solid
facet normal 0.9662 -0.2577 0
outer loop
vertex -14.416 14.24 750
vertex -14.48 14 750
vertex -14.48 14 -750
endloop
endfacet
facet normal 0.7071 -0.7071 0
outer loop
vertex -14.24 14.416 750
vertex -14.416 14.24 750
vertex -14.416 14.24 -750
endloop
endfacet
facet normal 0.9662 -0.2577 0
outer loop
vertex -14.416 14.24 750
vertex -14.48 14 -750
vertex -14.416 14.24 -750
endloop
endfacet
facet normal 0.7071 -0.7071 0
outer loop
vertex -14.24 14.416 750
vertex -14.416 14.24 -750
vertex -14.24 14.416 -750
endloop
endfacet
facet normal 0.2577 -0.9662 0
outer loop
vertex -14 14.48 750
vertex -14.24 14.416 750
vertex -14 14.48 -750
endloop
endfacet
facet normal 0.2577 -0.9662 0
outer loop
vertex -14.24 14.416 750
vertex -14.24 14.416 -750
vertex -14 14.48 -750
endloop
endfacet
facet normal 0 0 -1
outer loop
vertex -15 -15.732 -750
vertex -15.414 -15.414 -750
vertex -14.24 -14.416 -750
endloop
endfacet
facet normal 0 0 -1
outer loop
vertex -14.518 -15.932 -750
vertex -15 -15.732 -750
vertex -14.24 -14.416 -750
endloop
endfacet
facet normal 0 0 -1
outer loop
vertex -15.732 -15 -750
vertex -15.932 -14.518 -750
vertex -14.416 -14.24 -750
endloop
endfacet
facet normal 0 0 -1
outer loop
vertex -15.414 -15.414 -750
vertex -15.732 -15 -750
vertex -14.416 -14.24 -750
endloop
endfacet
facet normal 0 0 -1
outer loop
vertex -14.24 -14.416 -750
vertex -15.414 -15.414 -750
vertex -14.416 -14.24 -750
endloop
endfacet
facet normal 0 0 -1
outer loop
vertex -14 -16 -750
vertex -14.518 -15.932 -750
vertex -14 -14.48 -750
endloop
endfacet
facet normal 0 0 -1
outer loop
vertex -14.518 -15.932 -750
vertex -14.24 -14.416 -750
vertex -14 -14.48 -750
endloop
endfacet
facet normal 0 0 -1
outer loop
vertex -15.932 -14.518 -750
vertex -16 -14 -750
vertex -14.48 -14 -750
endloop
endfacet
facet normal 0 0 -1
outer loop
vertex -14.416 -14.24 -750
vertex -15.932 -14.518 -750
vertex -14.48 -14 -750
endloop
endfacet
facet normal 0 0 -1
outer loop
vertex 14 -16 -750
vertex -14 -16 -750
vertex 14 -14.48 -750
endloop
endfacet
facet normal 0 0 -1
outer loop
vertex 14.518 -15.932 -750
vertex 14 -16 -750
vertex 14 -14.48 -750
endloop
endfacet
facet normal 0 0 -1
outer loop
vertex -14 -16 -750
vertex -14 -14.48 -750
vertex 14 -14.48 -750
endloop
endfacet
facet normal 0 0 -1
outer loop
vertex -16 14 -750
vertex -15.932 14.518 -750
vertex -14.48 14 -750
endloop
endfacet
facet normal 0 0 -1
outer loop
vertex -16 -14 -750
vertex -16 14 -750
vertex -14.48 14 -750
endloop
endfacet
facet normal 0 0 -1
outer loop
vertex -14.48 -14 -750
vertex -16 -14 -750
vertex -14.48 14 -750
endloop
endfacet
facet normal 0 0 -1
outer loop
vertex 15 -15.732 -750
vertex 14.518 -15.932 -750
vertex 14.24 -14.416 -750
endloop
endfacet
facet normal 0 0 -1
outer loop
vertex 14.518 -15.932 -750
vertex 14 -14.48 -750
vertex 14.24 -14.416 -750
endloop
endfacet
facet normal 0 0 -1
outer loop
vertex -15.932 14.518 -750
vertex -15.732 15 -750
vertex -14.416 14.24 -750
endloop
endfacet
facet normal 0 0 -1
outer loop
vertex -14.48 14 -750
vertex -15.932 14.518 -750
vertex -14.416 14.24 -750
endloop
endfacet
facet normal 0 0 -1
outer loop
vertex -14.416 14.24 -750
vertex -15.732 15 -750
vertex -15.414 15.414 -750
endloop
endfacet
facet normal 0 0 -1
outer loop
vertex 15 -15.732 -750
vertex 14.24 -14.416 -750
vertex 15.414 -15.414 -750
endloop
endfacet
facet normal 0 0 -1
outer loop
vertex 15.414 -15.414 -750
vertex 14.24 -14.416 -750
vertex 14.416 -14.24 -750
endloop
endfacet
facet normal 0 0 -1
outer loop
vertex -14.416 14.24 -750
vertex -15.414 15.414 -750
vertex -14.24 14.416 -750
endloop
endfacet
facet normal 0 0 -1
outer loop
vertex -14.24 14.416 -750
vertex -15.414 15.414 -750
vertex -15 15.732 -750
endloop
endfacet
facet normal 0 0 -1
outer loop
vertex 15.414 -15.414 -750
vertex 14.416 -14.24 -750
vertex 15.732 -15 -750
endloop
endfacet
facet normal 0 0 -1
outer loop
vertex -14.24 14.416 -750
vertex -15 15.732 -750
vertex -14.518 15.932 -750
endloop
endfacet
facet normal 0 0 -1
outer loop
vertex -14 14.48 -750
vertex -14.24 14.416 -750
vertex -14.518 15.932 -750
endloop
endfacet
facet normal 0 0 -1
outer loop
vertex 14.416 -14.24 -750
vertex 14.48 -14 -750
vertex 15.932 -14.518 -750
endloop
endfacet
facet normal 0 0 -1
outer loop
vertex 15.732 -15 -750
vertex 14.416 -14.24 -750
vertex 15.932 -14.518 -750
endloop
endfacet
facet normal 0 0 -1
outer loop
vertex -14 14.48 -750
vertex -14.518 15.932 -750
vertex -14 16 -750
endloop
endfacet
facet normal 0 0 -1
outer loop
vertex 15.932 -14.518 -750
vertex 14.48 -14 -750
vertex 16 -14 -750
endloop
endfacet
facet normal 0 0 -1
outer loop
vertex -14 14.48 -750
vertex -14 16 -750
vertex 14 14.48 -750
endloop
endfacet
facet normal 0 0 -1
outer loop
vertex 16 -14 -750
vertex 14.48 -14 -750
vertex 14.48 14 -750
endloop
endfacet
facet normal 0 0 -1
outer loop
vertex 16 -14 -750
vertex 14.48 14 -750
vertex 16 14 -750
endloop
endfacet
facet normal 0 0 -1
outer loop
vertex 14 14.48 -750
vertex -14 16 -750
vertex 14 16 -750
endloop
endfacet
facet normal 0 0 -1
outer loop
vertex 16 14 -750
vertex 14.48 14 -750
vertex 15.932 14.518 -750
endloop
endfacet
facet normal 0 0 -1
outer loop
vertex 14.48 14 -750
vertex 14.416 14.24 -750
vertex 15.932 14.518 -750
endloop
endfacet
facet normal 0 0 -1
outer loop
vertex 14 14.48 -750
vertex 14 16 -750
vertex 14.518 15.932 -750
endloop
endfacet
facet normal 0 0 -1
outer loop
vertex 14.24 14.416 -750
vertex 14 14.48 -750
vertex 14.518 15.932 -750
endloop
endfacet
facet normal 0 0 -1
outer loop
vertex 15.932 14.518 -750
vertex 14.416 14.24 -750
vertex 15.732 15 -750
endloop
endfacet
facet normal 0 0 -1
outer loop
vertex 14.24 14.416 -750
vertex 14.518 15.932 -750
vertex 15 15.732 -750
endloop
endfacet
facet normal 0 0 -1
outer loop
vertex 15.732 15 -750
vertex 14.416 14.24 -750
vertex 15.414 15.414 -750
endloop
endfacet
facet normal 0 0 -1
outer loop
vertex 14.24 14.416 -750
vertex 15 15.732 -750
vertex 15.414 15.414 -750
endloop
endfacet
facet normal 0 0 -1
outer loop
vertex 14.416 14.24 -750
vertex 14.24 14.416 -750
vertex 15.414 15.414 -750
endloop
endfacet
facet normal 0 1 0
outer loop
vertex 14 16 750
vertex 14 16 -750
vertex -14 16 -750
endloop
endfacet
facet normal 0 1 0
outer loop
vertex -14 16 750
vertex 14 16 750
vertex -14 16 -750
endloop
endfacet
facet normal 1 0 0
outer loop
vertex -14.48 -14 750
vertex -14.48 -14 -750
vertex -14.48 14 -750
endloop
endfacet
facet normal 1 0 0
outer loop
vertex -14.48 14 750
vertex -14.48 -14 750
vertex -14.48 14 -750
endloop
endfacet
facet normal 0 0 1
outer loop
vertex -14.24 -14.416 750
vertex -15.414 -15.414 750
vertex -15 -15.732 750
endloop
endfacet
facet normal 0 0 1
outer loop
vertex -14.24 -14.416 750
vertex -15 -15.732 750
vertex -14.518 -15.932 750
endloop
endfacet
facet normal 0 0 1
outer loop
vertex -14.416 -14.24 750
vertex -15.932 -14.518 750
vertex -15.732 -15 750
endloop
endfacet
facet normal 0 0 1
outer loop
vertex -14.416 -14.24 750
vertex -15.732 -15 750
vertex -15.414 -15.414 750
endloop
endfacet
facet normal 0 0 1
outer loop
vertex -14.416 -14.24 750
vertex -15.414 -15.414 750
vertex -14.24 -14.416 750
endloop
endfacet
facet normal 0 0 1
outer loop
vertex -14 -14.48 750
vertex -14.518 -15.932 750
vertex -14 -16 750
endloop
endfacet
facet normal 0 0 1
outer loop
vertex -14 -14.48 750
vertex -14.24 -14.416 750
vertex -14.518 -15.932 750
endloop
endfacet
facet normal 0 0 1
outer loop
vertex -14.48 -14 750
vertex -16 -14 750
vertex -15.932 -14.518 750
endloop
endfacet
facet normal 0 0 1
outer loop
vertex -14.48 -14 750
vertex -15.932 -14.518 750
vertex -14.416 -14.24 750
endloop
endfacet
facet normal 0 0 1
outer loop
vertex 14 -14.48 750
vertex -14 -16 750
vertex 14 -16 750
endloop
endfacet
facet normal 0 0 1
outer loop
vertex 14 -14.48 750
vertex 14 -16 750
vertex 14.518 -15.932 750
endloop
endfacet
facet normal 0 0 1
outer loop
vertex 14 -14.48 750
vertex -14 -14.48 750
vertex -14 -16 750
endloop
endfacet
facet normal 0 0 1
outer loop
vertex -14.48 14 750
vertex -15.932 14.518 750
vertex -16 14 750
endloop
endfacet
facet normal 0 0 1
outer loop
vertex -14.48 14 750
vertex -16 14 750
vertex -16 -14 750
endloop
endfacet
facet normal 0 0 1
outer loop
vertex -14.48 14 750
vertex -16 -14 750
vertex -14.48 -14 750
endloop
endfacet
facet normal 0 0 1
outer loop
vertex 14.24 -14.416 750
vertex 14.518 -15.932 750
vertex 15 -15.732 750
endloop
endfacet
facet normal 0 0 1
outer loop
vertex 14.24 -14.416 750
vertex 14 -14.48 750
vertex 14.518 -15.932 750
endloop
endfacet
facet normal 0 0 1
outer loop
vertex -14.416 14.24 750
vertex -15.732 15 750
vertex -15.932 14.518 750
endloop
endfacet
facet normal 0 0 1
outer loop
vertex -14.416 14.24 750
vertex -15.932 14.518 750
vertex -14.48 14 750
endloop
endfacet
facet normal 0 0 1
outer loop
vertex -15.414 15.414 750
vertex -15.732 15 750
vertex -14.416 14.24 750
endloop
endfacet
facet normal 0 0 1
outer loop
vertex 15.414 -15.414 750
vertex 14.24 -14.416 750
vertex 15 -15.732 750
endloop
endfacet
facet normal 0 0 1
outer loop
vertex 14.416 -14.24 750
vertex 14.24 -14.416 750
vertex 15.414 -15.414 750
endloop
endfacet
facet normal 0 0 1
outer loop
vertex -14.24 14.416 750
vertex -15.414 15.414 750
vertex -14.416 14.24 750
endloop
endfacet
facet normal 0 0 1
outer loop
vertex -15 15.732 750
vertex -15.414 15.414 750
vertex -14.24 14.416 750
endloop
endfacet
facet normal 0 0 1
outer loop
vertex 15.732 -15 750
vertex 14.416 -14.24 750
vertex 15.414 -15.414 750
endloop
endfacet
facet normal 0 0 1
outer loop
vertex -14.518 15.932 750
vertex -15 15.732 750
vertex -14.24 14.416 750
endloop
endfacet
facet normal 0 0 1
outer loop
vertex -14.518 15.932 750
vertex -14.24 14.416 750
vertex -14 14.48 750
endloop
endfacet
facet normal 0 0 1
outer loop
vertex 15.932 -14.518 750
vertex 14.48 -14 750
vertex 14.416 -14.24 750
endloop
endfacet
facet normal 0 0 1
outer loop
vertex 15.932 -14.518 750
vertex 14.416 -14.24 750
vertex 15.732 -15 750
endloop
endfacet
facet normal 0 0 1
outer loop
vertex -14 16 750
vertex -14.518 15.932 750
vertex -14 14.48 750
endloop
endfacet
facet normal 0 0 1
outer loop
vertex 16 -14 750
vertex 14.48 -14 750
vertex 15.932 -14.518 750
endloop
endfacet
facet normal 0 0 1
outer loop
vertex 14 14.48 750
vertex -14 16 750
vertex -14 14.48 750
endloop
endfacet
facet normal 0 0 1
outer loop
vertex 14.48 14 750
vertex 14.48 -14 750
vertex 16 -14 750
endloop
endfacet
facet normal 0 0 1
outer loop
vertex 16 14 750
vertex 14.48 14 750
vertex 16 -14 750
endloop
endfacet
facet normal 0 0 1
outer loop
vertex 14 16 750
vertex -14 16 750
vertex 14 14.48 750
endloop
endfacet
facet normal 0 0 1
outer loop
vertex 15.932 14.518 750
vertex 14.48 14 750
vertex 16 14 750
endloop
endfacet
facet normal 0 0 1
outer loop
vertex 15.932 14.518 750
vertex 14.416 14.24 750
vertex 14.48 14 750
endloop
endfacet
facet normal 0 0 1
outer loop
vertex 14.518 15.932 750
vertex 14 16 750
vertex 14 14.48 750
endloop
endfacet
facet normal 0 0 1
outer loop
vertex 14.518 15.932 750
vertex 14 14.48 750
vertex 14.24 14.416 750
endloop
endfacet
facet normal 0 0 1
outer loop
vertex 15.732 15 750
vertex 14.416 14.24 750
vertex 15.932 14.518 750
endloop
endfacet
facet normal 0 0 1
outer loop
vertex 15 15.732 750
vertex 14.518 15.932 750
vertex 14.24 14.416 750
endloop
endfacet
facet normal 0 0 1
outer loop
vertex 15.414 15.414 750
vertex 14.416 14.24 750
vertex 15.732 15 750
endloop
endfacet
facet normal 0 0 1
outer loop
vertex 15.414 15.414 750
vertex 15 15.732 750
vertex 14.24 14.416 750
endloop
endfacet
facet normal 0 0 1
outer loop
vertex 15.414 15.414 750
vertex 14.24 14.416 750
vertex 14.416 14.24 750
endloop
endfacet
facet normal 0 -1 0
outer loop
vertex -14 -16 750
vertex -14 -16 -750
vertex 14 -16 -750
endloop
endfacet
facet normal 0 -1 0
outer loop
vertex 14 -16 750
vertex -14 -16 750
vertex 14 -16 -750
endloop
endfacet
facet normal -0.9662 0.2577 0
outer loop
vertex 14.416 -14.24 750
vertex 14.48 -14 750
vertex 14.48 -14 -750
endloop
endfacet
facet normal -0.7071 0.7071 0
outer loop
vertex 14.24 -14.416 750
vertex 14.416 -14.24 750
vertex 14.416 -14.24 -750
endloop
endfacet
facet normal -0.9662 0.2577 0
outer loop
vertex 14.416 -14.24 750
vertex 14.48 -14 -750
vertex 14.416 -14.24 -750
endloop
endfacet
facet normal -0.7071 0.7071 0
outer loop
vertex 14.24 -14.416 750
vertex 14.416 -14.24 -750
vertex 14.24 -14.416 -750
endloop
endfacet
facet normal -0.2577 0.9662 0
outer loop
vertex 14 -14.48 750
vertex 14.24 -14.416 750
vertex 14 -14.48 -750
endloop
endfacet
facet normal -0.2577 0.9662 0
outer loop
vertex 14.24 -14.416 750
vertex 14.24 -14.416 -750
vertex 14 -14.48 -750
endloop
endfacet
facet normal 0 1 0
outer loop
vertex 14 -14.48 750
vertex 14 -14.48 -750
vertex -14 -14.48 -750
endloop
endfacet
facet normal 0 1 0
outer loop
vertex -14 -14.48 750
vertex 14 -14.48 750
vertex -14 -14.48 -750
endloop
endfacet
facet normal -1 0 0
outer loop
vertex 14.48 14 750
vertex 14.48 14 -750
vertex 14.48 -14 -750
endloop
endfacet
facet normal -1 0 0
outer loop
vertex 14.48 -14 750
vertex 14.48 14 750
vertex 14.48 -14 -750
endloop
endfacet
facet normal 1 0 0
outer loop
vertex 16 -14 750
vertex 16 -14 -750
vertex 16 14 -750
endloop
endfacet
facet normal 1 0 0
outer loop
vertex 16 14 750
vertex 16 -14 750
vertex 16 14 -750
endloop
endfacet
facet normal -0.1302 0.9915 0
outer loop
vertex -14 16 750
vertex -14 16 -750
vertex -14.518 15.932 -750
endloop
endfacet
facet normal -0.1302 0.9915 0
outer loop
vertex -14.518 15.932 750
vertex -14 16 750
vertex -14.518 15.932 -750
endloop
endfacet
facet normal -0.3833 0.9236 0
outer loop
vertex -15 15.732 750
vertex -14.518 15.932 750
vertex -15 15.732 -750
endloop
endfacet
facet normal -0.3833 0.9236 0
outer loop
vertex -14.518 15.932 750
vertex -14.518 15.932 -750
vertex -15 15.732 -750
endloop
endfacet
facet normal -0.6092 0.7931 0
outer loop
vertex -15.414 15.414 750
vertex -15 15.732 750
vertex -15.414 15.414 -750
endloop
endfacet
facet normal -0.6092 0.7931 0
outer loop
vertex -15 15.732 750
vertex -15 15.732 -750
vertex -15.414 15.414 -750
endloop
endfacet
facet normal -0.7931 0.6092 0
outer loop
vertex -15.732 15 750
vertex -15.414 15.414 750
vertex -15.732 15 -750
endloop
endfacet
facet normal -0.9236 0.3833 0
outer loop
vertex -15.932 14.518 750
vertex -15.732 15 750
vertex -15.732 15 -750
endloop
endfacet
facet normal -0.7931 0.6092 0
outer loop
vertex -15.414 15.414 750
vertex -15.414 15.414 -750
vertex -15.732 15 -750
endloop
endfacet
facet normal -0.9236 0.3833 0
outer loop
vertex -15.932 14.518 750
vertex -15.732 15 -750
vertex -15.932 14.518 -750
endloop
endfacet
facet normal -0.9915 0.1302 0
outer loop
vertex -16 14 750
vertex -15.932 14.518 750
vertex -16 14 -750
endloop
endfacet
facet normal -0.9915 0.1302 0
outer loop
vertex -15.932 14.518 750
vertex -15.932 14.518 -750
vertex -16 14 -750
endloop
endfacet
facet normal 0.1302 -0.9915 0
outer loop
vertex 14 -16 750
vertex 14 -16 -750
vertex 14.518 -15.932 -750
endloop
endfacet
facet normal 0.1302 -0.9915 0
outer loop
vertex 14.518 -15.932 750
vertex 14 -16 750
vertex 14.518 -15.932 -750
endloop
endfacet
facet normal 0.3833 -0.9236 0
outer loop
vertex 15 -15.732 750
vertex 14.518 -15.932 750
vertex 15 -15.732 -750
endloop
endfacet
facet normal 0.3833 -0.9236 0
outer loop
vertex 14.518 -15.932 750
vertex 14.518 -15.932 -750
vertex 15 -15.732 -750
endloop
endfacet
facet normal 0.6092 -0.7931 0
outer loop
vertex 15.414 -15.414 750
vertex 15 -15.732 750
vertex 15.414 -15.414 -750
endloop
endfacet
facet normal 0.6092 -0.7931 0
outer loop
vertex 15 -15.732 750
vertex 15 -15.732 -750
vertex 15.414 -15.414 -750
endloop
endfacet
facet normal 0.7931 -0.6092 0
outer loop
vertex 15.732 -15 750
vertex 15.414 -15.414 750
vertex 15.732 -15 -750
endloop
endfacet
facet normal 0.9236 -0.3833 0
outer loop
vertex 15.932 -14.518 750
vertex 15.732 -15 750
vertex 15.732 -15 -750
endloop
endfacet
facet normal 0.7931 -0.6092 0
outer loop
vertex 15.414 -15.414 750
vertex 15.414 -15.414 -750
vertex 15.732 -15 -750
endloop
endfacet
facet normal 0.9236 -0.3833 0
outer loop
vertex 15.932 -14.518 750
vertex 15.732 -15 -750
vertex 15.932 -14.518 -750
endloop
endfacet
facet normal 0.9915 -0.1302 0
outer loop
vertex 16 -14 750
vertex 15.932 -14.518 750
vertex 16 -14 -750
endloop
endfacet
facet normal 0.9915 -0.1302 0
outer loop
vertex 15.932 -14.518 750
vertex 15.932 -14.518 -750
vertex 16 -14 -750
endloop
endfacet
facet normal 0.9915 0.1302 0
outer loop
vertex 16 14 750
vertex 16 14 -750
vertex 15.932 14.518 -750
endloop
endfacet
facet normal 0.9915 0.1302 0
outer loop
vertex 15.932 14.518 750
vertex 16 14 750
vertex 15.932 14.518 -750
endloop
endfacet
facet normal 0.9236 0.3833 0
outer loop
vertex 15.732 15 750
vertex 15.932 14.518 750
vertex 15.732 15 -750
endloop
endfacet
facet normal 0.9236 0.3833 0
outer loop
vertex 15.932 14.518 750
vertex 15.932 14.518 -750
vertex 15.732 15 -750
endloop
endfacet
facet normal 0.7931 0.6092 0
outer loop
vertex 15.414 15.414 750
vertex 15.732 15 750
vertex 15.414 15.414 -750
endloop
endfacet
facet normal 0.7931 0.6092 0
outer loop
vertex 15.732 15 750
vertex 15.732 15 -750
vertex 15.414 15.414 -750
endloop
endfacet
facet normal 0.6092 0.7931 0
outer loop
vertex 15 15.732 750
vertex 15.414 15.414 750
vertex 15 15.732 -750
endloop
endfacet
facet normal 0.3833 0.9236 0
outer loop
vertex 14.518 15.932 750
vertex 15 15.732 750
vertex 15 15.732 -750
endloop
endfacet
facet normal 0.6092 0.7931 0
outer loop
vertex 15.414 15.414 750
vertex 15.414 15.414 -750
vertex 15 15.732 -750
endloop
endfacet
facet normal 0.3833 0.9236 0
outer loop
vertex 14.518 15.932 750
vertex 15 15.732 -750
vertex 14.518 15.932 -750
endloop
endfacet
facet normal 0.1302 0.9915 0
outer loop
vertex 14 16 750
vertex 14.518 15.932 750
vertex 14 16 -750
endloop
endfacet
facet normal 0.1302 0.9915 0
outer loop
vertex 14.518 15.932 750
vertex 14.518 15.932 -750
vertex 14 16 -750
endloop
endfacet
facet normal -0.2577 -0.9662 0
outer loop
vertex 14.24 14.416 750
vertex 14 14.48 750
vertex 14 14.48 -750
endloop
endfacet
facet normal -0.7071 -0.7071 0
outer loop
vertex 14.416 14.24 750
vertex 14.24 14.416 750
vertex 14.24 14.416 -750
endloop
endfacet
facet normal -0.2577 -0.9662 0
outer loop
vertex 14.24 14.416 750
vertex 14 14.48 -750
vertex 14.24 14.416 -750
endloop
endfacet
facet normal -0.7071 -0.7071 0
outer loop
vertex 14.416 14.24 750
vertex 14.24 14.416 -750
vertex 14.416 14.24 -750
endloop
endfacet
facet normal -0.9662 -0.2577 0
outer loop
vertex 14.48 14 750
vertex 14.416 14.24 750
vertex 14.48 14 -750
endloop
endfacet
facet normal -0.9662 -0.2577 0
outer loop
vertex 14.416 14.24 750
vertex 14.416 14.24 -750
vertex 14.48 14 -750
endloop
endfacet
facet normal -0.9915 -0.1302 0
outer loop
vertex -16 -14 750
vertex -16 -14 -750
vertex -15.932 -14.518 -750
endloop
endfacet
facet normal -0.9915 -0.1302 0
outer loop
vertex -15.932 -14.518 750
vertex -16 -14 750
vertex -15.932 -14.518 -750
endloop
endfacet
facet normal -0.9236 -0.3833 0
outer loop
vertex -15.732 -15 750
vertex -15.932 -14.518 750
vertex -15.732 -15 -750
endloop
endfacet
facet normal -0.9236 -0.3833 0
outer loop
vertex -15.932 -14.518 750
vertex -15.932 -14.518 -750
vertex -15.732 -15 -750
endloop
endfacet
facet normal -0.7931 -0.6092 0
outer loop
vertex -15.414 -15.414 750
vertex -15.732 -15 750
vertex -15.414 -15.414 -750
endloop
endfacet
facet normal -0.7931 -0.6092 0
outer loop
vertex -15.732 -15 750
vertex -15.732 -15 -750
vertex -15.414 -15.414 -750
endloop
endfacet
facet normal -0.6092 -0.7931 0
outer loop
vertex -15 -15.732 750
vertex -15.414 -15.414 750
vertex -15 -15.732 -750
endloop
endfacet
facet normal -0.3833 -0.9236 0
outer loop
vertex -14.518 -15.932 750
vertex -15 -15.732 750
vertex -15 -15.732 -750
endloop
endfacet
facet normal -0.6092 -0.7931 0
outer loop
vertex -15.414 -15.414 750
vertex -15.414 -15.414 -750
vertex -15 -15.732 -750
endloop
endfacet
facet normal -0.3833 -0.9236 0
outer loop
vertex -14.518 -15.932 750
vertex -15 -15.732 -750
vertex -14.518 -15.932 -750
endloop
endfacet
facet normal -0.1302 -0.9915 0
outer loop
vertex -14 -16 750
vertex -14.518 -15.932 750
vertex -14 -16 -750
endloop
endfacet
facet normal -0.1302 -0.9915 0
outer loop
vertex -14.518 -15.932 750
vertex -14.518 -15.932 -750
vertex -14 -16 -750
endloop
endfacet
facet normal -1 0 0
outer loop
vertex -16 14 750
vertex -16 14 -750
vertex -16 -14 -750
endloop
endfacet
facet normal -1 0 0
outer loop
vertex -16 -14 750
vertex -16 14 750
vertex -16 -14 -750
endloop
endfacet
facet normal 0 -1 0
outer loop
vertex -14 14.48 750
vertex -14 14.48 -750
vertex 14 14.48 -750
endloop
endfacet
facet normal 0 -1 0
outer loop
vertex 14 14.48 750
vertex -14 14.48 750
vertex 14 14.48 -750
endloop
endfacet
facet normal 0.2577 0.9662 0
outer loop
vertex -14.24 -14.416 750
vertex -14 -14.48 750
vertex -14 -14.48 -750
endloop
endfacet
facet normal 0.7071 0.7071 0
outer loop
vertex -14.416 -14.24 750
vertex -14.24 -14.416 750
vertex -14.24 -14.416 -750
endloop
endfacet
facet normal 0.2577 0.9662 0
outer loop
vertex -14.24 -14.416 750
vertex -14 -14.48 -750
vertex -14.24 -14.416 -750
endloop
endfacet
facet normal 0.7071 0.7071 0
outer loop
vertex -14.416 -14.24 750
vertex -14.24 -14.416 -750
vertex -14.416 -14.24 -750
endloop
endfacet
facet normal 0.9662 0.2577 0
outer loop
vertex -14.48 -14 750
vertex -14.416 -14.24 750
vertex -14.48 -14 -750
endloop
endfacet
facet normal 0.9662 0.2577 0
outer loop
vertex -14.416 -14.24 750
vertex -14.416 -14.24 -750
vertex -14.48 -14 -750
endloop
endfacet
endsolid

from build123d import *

# Parameters (mm, degrees)
BOSS_EXTRUDE1_DEPTH      = 750
BOSS_EXTRUDE1_DEPTH_BACK = 750


with BuildPart() as part:
    # Sketch1 → Boss-Extrude1 (new, two sides: drawn at the far end of the back side and taken through both)
    with BuildSketch(Plane.XY.offset(-BOSS_EXTRUDE1_DEPTH_BACK)):
        with BuildLine():
            Line((-14, -16), (14, -16))
            ThreePointArc((14, -16), (15.414213562, -15.414213562), (16, -14))
            Line((16, -14), (16, 14))
            ThreePointArc((16, 14), (15.414213562, 15.414213562), (14, 16))
            Line((14, 16), (-14, 16))
            ThreePointArc((-14, 16), (-15.414213562, 15.414213562), (-16, 14))
            Line((-16, 14), (-16, -14))
            ThreePointArc((-16, -14), (-15.414213562, -15.414213562), (-14, -16))
        make_face()
        with BuildLine():
            Line((-14, 14.48), (14, 14.48))
            ThreePointArc((14, 14.48), (14.339411255, 14.339411255), (14.48, 14))
            Line((14.48, 14), (14.48, -14))
            ThreePointArc((14.48, -14), (14.339411255, -14.339411255), (14, -14.48))
            Line((14, -14.48), (-14, -14.48))
            ThreePointArc((-14, -14.48), (-14.339411255, -14.339411255), (-14.48, -14))
            Line((-14.48, -14), (-14.48, 14))
            ThreePointArc((-14.48, 14), (-14.339411255, 14.339411255), (-14, 14.48))
        make_face(mode=Mode.SUBTRACT)
    extrude(amount=BOSS_EXTRUDE1_DEPTH + BOSS_EXTRUDE1_DEPTH_BACK)


solid = part.part
